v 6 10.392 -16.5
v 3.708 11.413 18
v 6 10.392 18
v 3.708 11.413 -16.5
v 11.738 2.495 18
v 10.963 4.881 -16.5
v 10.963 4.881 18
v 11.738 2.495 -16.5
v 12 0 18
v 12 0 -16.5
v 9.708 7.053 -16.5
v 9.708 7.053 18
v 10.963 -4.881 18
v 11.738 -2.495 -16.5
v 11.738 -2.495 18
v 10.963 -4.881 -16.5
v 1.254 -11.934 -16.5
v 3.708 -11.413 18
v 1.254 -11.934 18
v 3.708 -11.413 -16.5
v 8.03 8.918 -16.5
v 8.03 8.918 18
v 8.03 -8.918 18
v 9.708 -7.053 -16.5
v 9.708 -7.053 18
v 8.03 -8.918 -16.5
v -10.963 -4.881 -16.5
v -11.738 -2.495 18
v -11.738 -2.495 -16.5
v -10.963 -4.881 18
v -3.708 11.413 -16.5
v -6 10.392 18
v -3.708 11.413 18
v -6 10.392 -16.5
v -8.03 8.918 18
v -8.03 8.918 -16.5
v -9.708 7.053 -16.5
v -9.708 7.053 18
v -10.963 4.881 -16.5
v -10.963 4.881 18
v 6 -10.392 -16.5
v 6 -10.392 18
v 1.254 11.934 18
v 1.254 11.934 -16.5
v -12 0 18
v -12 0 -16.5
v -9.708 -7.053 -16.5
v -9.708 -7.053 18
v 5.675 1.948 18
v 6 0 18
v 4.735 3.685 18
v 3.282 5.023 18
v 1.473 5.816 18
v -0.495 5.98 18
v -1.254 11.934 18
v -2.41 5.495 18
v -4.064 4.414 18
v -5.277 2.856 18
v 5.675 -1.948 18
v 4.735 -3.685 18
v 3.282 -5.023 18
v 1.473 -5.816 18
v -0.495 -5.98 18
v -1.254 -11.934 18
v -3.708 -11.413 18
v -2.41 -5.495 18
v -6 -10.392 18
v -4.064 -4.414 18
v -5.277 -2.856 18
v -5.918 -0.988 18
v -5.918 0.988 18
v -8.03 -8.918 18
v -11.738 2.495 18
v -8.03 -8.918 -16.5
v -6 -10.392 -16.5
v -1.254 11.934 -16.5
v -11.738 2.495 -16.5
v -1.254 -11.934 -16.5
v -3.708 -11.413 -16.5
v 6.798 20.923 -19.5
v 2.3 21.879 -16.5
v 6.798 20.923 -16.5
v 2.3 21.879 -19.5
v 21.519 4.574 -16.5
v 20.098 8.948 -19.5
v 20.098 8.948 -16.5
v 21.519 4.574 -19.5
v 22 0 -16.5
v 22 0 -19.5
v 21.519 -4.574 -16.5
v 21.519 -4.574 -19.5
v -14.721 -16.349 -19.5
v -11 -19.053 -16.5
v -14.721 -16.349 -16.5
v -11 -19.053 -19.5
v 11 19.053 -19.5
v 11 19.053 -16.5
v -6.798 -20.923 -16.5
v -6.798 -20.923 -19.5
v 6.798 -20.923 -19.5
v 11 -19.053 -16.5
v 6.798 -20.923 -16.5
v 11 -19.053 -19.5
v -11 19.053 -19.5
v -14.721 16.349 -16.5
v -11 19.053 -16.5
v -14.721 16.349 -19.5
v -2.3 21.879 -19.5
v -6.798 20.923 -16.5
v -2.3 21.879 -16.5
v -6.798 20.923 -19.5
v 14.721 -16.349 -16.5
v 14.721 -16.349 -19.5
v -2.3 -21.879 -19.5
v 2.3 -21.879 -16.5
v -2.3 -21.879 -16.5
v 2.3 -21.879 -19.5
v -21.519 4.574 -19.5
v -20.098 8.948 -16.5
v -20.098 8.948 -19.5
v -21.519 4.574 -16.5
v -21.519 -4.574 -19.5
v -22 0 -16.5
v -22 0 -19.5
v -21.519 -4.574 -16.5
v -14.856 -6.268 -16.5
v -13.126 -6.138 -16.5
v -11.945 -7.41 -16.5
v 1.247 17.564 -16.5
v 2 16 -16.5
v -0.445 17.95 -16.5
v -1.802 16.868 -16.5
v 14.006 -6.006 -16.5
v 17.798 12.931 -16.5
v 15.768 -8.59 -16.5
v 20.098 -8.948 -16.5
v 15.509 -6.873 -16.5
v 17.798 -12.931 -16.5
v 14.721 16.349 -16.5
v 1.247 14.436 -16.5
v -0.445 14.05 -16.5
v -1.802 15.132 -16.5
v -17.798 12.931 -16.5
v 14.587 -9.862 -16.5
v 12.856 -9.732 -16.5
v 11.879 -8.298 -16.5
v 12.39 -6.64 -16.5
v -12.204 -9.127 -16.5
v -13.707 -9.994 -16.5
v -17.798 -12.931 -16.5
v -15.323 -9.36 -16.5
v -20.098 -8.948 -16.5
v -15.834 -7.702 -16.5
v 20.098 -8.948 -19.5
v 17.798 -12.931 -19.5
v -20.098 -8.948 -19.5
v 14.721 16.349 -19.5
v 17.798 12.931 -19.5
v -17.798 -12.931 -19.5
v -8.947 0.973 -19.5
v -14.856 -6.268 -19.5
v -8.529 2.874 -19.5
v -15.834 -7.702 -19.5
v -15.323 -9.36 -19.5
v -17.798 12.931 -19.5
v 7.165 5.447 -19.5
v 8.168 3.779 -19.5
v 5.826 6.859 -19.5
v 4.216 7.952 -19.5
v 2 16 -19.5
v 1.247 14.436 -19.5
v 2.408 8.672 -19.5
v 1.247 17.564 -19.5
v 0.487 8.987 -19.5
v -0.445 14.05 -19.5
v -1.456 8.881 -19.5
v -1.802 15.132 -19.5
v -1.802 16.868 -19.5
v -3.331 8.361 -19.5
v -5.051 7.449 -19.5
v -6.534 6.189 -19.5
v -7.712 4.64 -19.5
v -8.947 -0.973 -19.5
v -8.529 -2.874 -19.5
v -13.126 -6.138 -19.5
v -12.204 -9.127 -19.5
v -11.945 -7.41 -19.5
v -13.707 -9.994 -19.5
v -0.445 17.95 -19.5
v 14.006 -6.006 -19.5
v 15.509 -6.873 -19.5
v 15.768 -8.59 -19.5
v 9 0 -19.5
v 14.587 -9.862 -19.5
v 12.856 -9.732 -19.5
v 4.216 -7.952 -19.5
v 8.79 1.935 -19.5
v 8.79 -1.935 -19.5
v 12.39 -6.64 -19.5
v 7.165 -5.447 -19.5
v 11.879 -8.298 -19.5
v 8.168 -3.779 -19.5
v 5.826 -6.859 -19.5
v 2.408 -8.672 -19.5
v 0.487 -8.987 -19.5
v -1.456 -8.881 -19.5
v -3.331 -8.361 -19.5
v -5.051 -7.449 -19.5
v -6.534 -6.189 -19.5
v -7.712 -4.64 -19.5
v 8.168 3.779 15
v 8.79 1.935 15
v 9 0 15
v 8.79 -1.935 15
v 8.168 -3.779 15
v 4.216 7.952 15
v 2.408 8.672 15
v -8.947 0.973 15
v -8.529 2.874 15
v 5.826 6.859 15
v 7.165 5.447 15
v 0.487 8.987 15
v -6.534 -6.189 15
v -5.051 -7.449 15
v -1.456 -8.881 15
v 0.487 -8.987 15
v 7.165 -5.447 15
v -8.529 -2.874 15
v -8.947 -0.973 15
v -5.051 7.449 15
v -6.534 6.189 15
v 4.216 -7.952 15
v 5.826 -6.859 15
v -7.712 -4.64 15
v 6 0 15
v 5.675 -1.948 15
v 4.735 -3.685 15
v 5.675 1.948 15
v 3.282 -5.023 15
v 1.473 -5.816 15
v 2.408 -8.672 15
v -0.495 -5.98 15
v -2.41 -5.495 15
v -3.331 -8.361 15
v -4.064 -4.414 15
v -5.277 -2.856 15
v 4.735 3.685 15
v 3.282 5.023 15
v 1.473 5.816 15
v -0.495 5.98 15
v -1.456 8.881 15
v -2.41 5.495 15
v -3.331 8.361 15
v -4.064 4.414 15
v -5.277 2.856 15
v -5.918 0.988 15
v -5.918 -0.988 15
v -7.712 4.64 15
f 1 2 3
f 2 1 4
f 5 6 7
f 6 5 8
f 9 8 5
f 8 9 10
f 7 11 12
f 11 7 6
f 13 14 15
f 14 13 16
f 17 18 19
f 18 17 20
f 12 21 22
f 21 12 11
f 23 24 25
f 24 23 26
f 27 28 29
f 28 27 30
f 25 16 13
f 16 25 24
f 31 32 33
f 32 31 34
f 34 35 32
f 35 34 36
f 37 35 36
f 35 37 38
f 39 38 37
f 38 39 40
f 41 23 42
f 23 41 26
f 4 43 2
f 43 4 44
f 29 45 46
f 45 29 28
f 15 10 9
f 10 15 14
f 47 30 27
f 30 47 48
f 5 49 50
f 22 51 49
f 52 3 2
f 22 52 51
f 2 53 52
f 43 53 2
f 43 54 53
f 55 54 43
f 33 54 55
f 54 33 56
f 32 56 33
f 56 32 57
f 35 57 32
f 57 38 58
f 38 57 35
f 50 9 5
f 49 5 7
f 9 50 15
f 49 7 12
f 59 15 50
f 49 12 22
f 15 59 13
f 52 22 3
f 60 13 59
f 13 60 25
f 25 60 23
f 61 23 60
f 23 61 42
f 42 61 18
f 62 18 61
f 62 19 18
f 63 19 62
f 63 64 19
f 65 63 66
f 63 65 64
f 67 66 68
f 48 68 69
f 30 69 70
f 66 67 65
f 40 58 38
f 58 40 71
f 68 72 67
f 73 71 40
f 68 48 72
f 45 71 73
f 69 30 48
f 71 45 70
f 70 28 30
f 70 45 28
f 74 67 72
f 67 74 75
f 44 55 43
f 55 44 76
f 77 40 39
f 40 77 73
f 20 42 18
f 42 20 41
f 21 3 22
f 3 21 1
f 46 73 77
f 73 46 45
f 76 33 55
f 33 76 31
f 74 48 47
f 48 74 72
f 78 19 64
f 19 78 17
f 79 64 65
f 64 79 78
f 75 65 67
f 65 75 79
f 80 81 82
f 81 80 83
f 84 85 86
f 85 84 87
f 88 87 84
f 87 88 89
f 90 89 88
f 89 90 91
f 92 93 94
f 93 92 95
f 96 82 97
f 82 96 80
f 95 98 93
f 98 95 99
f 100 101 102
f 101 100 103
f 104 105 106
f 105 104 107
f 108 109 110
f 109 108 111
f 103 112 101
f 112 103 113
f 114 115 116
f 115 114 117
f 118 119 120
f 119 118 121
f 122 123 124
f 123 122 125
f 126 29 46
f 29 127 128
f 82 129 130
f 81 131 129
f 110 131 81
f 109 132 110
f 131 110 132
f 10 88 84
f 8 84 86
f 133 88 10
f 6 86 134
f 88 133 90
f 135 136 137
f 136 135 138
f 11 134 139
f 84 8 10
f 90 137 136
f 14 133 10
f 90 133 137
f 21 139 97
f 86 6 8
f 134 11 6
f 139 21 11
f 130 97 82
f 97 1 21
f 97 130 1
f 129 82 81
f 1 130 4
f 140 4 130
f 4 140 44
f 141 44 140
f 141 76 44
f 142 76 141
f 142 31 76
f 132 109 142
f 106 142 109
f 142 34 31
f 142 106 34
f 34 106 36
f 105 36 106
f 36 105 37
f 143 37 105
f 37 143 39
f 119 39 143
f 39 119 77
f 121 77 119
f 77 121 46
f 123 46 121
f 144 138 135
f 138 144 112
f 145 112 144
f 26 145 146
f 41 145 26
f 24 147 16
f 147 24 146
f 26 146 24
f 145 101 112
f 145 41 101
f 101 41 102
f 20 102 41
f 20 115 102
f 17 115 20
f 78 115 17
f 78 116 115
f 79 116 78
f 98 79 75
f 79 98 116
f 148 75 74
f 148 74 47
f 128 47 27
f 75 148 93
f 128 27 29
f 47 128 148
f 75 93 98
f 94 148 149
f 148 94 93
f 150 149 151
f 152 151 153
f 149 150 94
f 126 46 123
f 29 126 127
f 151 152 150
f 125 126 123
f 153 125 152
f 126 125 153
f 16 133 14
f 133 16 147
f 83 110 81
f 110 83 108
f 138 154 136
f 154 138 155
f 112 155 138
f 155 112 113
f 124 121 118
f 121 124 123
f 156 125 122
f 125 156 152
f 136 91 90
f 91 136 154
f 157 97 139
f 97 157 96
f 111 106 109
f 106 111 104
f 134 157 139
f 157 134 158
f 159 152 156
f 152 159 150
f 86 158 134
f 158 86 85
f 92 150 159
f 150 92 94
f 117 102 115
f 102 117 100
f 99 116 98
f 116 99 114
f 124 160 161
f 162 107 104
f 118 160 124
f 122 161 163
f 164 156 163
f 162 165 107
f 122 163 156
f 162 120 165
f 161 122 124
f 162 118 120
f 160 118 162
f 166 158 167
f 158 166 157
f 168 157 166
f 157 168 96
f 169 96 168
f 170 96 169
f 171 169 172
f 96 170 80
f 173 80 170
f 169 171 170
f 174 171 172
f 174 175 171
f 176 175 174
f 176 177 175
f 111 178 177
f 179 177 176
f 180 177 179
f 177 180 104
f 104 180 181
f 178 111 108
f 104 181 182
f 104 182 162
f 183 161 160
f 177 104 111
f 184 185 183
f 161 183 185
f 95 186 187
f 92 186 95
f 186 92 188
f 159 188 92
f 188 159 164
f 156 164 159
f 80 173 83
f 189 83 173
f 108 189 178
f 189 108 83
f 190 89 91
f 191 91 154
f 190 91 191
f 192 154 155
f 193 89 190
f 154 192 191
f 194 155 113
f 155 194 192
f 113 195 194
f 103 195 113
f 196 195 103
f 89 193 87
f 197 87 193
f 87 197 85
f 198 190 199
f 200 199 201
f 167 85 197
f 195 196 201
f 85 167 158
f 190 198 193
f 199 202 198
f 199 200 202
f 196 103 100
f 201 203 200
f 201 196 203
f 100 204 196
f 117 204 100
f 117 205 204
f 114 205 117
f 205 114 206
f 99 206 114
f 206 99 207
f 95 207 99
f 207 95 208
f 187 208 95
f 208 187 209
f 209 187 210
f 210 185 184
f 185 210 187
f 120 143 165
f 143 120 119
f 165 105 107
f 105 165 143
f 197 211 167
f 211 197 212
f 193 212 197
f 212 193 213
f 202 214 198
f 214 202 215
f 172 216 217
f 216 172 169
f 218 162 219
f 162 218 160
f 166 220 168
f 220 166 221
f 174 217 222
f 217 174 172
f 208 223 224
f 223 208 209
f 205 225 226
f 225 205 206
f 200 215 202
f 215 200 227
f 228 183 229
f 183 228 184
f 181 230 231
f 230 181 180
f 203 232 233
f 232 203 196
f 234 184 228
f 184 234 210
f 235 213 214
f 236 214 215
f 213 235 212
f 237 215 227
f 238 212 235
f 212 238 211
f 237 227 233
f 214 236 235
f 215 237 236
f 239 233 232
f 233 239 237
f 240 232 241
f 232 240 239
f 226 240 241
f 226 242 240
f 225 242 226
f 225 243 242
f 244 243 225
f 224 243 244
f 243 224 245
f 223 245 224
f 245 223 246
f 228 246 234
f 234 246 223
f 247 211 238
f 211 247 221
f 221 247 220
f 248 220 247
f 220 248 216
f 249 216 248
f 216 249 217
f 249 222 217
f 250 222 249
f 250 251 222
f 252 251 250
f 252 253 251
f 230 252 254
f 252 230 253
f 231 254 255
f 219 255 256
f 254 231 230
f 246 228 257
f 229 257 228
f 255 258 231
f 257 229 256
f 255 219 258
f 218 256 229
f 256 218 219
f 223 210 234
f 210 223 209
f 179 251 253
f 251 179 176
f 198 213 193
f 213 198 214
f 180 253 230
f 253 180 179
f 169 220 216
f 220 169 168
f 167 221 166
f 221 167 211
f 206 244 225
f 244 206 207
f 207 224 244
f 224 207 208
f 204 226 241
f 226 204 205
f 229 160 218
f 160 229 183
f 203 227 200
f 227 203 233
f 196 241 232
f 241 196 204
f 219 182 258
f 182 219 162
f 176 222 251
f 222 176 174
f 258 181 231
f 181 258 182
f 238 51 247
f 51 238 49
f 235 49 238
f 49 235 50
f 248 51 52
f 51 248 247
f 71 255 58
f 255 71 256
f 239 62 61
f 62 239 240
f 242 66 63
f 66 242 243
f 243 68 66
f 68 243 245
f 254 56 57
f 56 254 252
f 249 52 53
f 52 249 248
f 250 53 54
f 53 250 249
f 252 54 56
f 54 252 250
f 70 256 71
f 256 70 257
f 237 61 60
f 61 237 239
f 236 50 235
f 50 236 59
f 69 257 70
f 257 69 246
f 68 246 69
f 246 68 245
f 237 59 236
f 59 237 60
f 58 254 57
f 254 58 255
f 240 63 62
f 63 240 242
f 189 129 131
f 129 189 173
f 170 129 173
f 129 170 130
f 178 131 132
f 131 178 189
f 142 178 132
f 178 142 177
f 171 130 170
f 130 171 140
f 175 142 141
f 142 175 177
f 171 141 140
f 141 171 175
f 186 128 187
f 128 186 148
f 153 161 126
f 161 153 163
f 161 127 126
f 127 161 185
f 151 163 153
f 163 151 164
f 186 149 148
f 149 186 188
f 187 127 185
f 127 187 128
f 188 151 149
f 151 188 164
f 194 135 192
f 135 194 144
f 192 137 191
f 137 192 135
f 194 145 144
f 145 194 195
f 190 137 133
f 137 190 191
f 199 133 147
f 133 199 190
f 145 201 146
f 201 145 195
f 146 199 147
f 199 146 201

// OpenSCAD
/*
 * Written by Dermot Tynan, Kalopa Research.
 * GPLv2.
 *
 * This is the definition for the five mast supports on the upper
 * leading-edge of the mast, A8 -> A12.
 *
 * All dimensions are in mm.
 */
module stepdriver_box()
{
	difference() {
		union() {
			cylinder(r = 12, h = 36, center = true);
			translate([0, 0, -18]) cylinder(r = 22, h = 3, center = true);
		}
		translate([0, 0, -3]) cylinder(r = 9, h = 36, center = true);
		cylinder(r = 6, h = 50, center = true);
		translate([0, 16, -18]) cylinder(r = 2, h = 8, center = true);
		rotate(a = [0, 0, 120]) translate([0, 16, -18]) cylinder(r = 2, h = 8, center = true);
		rotate(a = [0, 0, 240]) translate([0, 16, -18]) cylinder(r = 2, h = 8, center = true);
	}
}

stepdriver_box();
